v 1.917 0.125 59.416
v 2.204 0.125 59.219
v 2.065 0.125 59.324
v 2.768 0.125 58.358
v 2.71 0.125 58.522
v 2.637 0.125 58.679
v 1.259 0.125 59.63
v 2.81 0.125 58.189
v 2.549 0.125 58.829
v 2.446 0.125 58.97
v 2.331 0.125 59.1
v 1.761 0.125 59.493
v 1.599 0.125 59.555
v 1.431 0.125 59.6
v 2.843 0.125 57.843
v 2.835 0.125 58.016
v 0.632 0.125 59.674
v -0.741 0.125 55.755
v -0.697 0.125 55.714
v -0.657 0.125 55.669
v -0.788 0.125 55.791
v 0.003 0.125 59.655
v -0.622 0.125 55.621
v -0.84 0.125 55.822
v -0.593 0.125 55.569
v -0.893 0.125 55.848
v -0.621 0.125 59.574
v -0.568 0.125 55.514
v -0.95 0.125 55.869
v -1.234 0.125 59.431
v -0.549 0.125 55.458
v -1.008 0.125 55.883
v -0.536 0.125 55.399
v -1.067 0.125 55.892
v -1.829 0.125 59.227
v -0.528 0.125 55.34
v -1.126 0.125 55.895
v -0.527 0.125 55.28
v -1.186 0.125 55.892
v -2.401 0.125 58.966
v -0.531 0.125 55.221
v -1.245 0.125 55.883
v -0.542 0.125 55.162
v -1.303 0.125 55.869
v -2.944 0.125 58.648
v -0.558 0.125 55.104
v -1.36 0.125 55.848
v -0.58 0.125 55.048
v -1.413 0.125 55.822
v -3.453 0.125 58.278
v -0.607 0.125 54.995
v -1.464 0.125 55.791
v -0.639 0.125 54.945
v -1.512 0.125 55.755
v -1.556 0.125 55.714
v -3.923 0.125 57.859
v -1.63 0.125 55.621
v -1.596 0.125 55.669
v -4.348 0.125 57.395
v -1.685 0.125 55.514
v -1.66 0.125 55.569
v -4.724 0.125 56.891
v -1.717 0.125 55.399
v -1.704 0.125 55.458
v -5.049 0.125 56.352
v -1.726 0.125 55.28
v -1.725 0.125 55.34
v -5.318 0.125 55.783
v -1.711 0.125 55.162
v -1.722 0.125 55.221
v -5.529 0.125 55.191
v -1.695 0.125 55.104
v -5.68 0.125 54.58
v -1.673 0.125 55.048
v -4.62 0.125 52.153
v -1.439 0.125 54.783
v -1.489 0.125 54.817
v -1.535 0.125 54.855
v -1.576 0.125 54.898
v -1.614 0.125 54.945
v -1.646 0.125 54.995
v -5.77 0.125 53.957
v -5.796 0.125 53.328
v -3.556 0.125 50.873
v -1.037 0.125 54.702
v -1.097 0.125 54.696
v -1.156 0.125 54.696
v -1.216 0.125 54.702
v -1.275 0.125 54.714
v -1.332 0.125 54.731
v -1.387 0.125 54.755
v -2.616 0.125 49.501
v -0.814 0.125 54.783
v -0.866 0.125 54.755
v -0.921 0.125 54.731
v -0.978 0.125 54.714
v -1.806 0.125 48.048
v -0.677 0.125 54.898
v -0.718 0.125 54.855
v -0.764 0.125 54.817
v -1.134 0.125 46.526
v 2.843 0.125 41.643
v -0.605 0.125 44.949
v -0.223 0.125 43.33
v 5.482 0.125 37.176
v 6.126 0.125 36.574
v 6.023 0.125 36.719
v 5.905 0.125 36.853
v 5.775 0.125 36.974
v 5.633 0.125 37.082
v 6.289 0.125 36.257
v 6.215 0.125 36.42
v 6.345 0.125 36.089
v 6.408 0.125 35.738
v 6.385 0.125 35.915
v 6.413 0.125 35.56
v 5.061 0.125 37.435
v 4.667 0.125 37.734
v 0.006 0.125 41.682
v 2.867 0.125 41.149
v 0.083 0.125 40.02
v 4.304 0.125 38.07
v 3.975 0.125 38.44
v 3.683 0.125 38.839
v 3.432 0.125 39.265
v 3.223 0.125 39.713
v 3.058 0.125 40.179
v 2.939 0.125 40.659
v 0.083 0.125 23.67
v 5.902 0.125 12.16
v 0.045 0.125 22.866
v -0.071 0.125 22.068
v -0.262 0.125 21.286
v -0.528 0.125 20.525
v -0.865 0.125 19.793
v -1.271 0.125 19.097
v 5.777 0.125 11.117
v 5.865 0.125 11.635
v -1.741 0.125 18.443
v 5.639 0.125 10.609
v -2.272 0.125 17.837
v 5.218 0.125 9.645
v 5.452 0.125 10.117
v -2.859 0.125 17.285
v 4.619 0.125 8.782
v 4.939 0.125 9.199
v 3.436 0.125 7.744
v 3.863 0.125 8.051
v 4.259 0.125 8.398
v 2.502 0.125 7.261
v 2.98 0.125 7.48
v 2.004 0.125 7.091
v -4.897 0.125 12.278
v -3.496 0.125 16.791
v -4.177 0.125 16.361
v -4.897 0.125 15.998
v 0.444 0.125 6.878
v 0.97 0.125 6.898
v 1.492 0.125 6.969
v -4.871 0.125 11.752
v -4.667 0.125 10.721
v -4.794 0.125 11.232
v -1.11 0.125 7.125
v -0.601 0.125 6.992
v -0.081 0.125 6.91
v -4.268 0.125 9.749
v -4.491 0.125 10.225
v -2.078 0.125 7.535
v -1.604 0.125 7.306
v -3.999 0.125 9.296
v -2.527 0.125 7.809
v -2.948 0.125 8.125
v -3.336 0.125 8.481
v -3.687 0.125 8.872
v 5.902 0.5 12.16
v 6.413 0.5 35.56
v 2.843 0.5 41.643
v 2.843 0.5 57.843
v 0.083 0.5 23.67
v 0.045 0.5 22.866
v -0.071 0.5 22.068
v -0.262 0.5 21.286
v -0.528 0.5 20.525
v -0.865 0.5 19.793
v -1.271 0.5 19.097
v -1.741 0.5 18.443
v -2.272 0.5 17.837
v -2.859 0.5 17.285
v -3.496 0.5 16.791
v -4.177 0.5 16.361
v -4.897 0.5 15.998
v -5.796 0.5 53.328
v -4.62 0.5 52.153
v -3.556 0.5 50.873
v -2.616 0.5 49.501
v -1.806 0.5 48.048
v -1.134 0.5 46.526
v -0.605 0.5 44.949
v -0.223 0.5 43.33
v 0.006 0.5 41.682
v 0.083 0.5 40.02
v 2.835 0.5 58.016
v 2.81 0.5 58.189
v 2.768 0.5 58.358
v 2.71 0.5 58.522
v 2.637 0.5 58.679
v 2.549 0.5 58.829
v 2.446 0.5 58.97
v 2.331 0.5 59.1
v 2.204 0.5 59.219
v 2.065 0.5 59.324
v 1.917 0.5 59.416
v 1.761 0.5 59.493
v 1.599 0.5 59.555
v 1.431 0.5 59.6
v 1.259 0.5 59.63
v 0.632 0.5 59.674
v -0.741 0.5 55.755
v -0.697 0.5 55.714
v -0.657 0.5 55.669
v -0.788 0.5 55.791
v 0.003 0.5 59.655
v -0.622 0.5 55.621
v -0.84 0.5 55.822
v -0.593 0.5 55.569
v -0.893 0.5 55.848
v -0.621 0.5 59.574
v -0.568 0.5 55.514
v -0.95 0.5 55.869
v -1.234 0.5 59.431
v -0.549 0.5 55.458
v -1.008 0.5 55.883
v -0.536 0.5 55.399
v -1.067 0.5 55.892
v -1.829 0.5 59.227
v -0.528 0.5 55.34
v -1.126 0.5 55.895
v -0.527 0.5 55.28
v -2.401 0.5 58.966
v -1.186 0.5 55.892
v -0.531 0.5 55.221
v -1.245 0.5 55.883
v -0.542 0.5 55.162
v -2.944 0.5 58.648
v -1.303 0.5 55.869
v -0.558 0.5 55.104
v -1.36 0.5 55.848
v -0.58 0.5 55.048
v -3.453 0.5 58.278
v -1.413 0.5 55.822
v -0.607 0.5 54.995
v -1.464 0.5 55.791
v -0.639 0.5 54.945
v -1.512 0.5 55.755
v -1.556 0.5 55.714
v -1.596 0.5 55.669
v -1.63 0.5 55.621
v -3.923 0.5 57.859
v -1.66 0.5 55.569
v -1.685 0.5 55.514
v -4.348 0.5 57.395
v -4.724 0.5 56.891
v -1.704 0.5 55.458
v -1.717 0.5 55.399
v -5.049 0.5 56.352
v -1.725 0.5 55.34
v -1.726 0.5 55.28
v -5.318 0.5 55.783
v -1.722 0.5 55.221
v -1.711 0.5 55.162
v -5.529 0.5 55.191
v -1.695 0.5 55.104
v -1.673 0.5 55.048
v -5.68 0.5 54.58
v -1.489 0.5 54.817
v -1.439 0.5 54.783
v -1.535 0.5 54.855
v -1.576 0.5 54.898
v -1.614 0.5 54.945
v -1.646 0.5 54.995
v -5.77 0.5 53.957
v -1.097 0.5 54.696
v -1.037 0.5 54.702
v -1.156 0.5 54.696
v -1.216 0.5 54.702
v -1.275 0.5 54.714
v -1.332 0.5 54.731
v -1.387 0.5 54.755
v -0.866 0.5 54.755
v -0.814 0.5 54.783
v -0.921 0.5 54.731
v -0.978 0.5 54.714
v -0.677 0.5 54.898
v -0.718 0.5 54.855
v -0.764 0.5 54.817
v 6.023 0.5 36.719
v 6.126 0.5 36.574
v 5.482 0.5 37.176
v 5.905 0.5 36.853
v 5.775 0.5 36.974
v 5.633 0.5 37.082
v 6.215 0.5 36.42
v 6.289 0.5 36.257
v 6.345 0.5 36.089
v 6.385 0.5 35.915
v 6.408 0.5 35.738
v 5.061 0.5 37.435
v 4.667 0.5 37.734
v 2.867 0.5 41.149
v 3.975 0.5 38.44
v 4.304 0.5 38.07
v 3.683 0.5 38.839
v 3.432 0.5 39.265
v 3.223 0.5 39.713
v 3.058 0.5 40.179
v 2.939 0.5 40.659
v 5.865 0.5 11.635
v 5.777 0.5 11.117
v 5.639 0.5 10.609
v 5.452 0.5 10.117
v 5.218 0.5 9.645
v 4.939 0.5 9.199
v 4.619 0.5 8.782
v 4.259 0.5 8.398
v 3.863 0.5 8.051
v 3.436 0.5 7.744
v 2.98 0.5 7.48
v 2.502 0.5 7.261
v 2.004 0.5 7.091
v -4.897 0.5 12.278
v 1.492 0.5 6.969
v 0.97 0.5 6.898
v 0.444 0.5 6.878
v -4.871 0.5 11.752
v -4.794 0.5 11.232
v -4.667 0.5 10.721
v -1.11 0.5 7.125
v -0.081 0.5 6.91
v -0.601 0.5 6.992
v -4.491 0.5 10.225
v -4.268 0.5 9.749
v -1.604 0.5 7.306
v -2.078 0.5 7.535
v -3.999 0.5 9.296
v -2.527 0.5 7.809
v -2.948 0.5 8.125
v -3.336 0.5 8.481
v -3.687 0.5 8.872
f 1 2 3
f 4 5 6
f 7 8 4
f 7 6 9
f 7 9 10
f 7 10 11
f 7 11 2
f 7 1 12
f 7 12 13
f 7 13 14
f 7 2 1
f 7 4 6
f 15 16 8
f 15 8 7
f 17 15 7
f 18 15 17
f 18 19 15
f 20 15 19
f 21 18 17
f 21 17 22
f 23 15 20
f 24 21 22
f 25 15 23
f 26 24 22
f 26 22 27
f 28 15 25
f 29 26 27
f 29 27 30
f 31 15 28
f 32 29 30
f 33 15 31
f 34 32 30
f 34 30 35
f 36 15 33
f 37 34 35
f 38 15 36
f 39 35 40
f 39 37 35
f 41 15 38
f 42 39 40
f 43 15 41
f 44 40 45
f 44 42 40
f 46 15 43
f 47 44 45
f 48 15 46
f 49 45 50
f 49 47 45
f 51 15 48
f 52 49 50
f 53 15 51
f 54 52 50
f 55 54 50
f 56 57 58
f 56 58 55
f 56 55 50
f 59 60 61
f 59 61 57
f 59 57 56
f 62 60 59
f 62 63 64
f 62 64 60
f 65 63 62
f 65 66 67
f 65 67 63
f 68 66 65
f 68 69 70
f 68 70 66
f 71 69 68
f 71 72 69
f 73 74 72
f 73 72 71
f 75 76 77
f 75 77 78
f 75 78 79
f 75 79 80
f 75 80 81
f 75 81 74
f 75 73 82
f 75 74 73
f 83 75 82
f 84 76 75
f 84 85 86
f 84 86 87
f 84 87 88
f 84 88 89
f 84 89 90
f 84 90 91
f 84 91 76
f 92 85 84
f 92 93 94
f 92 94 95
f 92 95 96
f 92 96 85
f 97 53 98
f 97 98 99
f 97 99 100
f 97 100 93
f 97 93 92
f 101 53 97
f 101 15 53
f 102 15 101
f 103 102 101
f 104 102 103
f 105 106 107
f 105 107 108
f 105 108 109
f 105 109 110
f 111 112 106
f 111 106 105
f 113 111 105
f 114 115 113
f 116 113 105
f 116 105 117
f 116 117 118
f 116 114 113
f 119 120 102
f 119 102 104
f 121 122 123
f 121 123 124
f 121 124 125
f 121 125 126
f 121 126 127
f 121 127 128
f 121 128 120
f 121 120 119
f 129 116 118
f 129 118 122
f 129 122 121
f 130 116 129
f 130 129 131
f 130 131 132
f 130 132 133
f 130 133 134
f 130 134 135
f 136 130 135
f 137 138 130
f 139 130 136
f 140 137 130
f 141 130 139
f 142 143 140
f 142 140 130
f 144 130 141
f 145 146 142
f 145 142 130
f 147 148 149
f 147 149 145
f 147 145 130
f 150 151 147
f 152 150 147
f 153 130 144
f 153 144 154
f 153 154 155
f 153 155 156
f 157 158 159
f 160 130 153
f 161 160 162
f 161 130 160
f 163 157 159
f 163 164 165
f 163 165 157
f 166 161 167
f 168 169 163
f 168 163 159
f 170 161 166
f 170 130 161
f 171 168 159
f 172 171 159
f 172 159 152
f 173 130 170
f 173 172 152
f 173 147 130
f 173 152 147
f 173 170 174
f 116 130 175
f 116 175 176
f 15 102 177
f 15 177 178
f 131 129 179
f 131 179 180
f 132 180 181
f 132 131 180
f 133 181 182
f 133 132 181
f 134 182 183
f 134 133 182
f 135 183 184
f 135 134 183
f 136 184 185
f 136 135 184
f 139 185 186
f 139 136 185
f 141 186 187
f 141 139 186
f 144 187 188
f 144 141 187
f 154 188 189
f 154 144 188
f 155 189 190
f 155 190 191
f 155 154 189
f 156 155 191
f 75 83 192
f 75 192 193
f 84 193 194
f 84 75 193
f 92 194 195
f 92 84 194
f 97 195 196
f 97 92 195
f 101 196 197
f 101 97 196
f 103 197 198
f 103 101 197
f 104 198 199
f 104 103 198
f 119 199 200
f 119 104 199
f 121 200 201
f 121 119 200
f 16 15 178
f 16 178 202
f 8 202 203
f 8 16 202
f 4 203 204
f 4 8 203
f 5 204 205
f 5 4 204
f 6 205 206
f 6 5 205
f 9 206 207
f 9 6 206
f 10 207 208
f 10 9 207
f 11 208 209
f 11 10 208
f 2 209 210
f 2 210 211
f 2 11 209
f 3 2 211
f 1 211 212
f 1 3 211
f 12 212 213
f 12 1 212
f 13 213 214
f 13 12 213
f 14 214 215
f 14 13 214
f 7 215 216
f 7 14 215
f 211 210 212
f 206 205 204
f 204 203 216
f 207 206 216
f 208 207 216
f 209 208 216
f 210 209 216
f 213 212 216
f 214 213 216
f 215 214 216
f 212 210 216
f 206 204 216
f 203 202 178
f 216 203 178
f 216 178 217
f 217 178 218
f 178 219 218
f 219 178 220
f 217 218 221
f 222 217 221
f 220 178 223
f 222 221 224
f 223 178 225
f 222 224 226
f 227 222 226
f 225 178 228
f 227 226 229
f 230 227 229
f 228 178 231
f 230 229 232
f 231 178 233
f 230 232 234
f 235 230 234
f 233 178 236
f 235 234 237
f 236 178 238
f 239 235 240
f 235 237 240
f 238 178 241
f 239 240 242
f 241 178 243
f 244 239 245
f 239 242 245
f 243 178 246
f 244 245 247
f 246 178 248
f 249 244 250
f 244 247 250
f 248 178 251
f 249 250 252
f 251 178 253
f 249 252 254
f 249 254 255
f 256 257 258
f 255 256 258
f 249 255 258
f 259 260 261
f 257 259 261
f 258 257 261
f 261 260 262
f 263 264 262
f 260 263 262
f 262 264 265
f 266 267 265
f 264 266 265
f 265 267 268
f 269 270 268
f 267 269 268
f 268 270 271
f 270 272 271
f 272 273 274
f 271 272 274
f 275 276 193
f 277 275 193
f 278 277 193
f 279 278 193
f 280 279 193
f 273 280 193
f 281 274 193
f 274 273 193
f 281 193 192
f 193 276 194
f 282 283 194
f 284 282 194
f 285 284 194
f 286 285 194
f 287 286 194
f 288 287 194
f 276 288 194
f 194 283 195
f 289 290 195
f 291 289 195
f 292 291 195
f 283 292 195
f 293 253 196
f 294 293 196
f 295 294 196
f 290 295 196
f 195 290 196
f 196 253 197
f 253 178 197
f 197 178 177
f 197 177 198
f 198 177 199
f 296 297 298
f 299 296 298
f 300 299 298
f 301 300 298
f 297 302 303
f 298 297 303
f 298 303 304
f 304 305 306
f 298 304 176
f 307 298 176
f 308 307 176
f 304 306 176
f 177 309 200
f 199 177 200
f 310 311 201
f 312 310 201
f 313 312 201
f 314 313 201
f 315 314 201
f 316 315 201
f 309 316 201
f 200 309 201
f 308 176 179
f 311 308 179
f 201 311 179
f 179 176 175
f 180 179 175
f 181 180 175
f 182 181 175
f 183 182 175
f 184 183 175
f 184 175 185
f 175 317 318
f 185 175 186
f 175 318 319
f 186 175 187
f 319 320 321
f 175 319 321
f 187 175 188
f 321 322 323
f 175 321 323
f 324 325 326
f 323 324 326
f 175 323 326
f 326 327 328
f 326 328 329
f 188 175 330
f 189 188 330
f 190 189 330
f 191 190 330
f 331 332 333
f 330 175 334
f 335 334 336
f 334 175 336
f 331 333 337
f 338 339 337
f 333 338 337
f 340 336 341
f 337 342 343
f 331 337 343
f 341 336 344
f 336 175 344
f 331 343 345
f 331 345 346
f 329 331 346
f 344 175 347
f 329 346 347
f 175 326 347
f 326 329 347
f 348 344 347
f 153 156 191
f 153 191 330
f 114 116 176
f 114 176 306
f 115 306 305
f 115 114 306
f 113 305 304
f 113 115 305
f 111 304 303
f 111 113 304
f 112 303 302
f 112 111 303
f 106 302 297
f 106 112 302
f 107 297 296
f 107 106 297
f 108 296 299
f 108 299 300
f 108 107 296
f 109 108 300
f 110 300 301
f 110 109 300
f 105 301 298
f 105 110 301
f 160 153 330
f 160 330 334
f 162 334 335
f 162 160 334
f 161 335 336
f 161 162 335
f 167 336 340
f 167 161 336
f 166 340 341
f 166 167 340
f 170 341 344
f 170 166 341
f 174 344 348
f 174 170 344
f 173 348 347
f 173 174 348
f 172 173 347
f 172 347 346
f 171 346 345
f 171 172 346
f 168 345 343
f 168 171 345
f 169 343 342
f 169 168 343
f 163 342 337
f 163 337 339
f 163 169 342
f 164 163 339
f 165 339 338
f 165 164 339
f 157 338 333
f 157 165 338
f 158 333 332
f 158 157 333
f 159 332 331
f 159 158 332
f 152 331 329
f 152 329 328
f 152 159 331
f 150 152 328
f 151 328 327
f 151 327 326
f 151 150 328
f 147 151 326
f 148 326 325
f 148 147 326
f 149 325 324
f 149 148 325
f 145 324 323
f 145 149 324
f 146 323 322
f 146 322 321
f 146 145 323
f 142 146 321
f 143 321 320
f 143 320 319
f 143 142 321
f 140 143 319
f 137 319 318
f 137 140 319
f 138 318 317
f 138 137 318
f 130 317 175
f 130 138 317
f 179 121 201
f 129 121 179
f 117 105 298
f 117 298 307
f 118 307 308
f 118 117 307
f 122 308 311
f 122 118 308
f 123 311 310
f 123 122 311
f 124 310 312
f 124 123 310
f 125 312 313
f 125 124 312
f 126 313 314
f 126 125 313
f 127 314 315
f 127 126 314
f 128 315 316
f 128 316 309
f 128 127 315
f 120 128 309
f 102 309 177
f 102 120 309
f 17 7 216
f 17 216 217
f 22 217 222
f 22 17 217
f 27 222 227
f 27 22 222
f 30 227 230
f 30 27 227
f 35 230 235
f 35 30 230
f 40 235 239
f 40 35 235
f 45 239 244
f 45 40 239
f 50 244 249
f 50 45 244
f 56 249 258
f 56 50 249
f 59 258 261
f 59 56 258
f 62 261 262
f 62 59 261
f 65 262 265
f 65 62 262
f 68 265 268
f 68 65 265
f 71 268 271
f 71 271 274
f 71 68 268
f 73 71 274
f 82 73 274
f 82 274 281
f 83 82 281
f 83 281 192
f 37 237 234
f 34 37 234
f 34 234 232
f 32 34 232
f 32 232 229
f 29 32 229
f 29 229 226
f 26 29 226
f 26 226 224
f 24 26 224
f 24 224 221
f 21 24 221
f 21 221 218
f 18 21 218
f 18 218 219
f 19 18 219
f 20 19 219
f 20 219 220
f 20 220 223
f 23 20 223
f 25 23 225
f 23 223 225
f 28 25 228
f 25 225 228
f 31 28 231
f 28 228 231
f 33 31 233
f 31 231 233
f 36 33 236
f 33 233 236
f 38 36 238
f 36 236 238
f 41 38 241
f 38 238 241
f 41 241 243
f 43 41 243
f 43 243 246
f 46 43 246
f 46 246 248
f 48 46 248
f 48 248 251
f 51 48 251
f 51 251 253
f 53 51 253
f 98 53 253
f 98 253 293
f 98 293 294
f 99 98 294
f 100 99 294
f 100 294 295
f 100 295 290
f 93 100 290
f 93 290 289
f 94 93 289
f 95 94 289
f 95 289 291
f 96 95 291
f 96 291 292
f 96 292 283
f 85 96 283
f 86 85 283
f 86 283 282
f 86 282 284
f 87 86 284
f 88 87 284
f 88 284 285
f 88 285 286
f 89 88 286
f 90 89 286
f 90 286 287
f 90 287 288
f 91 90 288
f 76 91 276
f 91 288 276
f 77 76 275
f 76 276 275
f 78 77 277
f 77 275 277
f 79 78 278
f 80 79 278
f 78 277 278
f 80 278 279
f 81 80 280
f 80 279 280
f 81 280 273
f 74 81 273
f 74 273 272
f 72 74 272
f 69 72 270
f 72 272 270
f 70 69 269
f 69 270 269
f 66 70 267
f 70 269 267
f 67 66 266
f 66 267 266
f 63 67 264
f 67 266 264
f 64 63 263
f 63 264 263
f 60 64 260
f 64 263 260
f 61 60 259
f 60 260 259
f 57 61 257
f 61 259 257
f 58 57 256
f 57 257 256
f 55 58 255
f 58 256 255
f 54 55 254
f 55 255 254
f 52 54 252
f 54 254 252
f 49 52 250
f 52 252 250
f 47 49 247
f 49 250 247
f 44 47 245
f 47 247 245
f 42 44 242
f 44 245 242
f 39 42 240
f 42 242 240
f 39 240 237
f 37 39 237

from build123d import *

# Parameters (mm, degrees)
BOSS_EXTRUDE1_DEPTH = 0.625
SKETCH2_R           = 1
CUT_EXTRUDE1_DEPTH  = 2
SCALE1_SCALE        = 0.6


with BuildPart() as part:
    # Sketch1 → Boss-Extrude1 (new body)
    with BuildSketch(Plane(origin=(0, 0, 0), x_dir=(1, 0, 0), z_dir=(0, 1, 0))):
        with BuildLine():
            Line((8.997858244, 0.196333965), (9.848841271, -38.803666035))
            ThreePointArc((9.848841271, -38.803666035), (9.449049837, -40.366651199), (8.297497314, -41.496555))
            ThreePointArc((8.297497314, -41.496555), (5.081486735, -44.617860887), (3.9, -48.940980546))
            Line((3.9, -48.940980546), (3.9, -75.940980546))
            ThreePointArc((3.9, -75.940980546), (3.144994432, -77.930955421), (1.26, -78.919302221))
            ThreePointArc((1.26, -78.919302221), (-6.994111479, -76.326677148), (-10.499709039, -68.417009214))
            ThreePointArc((-10.499709039, -68.417009214), (-3.259075008, -58.361278544), (-0.7, -46.237102878))
            Line((-0.7, -46.237102878), (-0.7, -18.987102878))
            ThreePointArc((-0.7, -18.987102878), (-2.95691693, -11.364767277), (-9, -6.2))
            Line((-9, -6.2), (-9, 0))
            ThreePointArc((-9, 0), (-0.098172823, 8.999464545), (8.997858244, 0.196333965))
        make_face()
    extrude(amount=BOSS_EXTRUDE1_DEPTH)

    # Sketch2 → Cut-Extrude1 (cut)
    with BuildSketch(Plane(origin=(0, 0.625, 0), x_dir=(1, 0, 0), z_dir=(0, 1, 0))):
        with Locations(Location((-2.716354086, -71.695176359, 0), (0, 0, 270))):
            Circle(SKETCH2_R)
    extrude(amount=-CUT_EXTRUDE1_DEPTH, mode=Mode.SUBTRACT)


with BuildPart() as part_1:
    # Scale1: scaled about (1.258353423, 0.3125, 30.69527069)
    add(part.part.scale(SCALE1_SCALE).moved(Location((0.503341369, 0.125, 12.278108276))))


solid = part_1.part
